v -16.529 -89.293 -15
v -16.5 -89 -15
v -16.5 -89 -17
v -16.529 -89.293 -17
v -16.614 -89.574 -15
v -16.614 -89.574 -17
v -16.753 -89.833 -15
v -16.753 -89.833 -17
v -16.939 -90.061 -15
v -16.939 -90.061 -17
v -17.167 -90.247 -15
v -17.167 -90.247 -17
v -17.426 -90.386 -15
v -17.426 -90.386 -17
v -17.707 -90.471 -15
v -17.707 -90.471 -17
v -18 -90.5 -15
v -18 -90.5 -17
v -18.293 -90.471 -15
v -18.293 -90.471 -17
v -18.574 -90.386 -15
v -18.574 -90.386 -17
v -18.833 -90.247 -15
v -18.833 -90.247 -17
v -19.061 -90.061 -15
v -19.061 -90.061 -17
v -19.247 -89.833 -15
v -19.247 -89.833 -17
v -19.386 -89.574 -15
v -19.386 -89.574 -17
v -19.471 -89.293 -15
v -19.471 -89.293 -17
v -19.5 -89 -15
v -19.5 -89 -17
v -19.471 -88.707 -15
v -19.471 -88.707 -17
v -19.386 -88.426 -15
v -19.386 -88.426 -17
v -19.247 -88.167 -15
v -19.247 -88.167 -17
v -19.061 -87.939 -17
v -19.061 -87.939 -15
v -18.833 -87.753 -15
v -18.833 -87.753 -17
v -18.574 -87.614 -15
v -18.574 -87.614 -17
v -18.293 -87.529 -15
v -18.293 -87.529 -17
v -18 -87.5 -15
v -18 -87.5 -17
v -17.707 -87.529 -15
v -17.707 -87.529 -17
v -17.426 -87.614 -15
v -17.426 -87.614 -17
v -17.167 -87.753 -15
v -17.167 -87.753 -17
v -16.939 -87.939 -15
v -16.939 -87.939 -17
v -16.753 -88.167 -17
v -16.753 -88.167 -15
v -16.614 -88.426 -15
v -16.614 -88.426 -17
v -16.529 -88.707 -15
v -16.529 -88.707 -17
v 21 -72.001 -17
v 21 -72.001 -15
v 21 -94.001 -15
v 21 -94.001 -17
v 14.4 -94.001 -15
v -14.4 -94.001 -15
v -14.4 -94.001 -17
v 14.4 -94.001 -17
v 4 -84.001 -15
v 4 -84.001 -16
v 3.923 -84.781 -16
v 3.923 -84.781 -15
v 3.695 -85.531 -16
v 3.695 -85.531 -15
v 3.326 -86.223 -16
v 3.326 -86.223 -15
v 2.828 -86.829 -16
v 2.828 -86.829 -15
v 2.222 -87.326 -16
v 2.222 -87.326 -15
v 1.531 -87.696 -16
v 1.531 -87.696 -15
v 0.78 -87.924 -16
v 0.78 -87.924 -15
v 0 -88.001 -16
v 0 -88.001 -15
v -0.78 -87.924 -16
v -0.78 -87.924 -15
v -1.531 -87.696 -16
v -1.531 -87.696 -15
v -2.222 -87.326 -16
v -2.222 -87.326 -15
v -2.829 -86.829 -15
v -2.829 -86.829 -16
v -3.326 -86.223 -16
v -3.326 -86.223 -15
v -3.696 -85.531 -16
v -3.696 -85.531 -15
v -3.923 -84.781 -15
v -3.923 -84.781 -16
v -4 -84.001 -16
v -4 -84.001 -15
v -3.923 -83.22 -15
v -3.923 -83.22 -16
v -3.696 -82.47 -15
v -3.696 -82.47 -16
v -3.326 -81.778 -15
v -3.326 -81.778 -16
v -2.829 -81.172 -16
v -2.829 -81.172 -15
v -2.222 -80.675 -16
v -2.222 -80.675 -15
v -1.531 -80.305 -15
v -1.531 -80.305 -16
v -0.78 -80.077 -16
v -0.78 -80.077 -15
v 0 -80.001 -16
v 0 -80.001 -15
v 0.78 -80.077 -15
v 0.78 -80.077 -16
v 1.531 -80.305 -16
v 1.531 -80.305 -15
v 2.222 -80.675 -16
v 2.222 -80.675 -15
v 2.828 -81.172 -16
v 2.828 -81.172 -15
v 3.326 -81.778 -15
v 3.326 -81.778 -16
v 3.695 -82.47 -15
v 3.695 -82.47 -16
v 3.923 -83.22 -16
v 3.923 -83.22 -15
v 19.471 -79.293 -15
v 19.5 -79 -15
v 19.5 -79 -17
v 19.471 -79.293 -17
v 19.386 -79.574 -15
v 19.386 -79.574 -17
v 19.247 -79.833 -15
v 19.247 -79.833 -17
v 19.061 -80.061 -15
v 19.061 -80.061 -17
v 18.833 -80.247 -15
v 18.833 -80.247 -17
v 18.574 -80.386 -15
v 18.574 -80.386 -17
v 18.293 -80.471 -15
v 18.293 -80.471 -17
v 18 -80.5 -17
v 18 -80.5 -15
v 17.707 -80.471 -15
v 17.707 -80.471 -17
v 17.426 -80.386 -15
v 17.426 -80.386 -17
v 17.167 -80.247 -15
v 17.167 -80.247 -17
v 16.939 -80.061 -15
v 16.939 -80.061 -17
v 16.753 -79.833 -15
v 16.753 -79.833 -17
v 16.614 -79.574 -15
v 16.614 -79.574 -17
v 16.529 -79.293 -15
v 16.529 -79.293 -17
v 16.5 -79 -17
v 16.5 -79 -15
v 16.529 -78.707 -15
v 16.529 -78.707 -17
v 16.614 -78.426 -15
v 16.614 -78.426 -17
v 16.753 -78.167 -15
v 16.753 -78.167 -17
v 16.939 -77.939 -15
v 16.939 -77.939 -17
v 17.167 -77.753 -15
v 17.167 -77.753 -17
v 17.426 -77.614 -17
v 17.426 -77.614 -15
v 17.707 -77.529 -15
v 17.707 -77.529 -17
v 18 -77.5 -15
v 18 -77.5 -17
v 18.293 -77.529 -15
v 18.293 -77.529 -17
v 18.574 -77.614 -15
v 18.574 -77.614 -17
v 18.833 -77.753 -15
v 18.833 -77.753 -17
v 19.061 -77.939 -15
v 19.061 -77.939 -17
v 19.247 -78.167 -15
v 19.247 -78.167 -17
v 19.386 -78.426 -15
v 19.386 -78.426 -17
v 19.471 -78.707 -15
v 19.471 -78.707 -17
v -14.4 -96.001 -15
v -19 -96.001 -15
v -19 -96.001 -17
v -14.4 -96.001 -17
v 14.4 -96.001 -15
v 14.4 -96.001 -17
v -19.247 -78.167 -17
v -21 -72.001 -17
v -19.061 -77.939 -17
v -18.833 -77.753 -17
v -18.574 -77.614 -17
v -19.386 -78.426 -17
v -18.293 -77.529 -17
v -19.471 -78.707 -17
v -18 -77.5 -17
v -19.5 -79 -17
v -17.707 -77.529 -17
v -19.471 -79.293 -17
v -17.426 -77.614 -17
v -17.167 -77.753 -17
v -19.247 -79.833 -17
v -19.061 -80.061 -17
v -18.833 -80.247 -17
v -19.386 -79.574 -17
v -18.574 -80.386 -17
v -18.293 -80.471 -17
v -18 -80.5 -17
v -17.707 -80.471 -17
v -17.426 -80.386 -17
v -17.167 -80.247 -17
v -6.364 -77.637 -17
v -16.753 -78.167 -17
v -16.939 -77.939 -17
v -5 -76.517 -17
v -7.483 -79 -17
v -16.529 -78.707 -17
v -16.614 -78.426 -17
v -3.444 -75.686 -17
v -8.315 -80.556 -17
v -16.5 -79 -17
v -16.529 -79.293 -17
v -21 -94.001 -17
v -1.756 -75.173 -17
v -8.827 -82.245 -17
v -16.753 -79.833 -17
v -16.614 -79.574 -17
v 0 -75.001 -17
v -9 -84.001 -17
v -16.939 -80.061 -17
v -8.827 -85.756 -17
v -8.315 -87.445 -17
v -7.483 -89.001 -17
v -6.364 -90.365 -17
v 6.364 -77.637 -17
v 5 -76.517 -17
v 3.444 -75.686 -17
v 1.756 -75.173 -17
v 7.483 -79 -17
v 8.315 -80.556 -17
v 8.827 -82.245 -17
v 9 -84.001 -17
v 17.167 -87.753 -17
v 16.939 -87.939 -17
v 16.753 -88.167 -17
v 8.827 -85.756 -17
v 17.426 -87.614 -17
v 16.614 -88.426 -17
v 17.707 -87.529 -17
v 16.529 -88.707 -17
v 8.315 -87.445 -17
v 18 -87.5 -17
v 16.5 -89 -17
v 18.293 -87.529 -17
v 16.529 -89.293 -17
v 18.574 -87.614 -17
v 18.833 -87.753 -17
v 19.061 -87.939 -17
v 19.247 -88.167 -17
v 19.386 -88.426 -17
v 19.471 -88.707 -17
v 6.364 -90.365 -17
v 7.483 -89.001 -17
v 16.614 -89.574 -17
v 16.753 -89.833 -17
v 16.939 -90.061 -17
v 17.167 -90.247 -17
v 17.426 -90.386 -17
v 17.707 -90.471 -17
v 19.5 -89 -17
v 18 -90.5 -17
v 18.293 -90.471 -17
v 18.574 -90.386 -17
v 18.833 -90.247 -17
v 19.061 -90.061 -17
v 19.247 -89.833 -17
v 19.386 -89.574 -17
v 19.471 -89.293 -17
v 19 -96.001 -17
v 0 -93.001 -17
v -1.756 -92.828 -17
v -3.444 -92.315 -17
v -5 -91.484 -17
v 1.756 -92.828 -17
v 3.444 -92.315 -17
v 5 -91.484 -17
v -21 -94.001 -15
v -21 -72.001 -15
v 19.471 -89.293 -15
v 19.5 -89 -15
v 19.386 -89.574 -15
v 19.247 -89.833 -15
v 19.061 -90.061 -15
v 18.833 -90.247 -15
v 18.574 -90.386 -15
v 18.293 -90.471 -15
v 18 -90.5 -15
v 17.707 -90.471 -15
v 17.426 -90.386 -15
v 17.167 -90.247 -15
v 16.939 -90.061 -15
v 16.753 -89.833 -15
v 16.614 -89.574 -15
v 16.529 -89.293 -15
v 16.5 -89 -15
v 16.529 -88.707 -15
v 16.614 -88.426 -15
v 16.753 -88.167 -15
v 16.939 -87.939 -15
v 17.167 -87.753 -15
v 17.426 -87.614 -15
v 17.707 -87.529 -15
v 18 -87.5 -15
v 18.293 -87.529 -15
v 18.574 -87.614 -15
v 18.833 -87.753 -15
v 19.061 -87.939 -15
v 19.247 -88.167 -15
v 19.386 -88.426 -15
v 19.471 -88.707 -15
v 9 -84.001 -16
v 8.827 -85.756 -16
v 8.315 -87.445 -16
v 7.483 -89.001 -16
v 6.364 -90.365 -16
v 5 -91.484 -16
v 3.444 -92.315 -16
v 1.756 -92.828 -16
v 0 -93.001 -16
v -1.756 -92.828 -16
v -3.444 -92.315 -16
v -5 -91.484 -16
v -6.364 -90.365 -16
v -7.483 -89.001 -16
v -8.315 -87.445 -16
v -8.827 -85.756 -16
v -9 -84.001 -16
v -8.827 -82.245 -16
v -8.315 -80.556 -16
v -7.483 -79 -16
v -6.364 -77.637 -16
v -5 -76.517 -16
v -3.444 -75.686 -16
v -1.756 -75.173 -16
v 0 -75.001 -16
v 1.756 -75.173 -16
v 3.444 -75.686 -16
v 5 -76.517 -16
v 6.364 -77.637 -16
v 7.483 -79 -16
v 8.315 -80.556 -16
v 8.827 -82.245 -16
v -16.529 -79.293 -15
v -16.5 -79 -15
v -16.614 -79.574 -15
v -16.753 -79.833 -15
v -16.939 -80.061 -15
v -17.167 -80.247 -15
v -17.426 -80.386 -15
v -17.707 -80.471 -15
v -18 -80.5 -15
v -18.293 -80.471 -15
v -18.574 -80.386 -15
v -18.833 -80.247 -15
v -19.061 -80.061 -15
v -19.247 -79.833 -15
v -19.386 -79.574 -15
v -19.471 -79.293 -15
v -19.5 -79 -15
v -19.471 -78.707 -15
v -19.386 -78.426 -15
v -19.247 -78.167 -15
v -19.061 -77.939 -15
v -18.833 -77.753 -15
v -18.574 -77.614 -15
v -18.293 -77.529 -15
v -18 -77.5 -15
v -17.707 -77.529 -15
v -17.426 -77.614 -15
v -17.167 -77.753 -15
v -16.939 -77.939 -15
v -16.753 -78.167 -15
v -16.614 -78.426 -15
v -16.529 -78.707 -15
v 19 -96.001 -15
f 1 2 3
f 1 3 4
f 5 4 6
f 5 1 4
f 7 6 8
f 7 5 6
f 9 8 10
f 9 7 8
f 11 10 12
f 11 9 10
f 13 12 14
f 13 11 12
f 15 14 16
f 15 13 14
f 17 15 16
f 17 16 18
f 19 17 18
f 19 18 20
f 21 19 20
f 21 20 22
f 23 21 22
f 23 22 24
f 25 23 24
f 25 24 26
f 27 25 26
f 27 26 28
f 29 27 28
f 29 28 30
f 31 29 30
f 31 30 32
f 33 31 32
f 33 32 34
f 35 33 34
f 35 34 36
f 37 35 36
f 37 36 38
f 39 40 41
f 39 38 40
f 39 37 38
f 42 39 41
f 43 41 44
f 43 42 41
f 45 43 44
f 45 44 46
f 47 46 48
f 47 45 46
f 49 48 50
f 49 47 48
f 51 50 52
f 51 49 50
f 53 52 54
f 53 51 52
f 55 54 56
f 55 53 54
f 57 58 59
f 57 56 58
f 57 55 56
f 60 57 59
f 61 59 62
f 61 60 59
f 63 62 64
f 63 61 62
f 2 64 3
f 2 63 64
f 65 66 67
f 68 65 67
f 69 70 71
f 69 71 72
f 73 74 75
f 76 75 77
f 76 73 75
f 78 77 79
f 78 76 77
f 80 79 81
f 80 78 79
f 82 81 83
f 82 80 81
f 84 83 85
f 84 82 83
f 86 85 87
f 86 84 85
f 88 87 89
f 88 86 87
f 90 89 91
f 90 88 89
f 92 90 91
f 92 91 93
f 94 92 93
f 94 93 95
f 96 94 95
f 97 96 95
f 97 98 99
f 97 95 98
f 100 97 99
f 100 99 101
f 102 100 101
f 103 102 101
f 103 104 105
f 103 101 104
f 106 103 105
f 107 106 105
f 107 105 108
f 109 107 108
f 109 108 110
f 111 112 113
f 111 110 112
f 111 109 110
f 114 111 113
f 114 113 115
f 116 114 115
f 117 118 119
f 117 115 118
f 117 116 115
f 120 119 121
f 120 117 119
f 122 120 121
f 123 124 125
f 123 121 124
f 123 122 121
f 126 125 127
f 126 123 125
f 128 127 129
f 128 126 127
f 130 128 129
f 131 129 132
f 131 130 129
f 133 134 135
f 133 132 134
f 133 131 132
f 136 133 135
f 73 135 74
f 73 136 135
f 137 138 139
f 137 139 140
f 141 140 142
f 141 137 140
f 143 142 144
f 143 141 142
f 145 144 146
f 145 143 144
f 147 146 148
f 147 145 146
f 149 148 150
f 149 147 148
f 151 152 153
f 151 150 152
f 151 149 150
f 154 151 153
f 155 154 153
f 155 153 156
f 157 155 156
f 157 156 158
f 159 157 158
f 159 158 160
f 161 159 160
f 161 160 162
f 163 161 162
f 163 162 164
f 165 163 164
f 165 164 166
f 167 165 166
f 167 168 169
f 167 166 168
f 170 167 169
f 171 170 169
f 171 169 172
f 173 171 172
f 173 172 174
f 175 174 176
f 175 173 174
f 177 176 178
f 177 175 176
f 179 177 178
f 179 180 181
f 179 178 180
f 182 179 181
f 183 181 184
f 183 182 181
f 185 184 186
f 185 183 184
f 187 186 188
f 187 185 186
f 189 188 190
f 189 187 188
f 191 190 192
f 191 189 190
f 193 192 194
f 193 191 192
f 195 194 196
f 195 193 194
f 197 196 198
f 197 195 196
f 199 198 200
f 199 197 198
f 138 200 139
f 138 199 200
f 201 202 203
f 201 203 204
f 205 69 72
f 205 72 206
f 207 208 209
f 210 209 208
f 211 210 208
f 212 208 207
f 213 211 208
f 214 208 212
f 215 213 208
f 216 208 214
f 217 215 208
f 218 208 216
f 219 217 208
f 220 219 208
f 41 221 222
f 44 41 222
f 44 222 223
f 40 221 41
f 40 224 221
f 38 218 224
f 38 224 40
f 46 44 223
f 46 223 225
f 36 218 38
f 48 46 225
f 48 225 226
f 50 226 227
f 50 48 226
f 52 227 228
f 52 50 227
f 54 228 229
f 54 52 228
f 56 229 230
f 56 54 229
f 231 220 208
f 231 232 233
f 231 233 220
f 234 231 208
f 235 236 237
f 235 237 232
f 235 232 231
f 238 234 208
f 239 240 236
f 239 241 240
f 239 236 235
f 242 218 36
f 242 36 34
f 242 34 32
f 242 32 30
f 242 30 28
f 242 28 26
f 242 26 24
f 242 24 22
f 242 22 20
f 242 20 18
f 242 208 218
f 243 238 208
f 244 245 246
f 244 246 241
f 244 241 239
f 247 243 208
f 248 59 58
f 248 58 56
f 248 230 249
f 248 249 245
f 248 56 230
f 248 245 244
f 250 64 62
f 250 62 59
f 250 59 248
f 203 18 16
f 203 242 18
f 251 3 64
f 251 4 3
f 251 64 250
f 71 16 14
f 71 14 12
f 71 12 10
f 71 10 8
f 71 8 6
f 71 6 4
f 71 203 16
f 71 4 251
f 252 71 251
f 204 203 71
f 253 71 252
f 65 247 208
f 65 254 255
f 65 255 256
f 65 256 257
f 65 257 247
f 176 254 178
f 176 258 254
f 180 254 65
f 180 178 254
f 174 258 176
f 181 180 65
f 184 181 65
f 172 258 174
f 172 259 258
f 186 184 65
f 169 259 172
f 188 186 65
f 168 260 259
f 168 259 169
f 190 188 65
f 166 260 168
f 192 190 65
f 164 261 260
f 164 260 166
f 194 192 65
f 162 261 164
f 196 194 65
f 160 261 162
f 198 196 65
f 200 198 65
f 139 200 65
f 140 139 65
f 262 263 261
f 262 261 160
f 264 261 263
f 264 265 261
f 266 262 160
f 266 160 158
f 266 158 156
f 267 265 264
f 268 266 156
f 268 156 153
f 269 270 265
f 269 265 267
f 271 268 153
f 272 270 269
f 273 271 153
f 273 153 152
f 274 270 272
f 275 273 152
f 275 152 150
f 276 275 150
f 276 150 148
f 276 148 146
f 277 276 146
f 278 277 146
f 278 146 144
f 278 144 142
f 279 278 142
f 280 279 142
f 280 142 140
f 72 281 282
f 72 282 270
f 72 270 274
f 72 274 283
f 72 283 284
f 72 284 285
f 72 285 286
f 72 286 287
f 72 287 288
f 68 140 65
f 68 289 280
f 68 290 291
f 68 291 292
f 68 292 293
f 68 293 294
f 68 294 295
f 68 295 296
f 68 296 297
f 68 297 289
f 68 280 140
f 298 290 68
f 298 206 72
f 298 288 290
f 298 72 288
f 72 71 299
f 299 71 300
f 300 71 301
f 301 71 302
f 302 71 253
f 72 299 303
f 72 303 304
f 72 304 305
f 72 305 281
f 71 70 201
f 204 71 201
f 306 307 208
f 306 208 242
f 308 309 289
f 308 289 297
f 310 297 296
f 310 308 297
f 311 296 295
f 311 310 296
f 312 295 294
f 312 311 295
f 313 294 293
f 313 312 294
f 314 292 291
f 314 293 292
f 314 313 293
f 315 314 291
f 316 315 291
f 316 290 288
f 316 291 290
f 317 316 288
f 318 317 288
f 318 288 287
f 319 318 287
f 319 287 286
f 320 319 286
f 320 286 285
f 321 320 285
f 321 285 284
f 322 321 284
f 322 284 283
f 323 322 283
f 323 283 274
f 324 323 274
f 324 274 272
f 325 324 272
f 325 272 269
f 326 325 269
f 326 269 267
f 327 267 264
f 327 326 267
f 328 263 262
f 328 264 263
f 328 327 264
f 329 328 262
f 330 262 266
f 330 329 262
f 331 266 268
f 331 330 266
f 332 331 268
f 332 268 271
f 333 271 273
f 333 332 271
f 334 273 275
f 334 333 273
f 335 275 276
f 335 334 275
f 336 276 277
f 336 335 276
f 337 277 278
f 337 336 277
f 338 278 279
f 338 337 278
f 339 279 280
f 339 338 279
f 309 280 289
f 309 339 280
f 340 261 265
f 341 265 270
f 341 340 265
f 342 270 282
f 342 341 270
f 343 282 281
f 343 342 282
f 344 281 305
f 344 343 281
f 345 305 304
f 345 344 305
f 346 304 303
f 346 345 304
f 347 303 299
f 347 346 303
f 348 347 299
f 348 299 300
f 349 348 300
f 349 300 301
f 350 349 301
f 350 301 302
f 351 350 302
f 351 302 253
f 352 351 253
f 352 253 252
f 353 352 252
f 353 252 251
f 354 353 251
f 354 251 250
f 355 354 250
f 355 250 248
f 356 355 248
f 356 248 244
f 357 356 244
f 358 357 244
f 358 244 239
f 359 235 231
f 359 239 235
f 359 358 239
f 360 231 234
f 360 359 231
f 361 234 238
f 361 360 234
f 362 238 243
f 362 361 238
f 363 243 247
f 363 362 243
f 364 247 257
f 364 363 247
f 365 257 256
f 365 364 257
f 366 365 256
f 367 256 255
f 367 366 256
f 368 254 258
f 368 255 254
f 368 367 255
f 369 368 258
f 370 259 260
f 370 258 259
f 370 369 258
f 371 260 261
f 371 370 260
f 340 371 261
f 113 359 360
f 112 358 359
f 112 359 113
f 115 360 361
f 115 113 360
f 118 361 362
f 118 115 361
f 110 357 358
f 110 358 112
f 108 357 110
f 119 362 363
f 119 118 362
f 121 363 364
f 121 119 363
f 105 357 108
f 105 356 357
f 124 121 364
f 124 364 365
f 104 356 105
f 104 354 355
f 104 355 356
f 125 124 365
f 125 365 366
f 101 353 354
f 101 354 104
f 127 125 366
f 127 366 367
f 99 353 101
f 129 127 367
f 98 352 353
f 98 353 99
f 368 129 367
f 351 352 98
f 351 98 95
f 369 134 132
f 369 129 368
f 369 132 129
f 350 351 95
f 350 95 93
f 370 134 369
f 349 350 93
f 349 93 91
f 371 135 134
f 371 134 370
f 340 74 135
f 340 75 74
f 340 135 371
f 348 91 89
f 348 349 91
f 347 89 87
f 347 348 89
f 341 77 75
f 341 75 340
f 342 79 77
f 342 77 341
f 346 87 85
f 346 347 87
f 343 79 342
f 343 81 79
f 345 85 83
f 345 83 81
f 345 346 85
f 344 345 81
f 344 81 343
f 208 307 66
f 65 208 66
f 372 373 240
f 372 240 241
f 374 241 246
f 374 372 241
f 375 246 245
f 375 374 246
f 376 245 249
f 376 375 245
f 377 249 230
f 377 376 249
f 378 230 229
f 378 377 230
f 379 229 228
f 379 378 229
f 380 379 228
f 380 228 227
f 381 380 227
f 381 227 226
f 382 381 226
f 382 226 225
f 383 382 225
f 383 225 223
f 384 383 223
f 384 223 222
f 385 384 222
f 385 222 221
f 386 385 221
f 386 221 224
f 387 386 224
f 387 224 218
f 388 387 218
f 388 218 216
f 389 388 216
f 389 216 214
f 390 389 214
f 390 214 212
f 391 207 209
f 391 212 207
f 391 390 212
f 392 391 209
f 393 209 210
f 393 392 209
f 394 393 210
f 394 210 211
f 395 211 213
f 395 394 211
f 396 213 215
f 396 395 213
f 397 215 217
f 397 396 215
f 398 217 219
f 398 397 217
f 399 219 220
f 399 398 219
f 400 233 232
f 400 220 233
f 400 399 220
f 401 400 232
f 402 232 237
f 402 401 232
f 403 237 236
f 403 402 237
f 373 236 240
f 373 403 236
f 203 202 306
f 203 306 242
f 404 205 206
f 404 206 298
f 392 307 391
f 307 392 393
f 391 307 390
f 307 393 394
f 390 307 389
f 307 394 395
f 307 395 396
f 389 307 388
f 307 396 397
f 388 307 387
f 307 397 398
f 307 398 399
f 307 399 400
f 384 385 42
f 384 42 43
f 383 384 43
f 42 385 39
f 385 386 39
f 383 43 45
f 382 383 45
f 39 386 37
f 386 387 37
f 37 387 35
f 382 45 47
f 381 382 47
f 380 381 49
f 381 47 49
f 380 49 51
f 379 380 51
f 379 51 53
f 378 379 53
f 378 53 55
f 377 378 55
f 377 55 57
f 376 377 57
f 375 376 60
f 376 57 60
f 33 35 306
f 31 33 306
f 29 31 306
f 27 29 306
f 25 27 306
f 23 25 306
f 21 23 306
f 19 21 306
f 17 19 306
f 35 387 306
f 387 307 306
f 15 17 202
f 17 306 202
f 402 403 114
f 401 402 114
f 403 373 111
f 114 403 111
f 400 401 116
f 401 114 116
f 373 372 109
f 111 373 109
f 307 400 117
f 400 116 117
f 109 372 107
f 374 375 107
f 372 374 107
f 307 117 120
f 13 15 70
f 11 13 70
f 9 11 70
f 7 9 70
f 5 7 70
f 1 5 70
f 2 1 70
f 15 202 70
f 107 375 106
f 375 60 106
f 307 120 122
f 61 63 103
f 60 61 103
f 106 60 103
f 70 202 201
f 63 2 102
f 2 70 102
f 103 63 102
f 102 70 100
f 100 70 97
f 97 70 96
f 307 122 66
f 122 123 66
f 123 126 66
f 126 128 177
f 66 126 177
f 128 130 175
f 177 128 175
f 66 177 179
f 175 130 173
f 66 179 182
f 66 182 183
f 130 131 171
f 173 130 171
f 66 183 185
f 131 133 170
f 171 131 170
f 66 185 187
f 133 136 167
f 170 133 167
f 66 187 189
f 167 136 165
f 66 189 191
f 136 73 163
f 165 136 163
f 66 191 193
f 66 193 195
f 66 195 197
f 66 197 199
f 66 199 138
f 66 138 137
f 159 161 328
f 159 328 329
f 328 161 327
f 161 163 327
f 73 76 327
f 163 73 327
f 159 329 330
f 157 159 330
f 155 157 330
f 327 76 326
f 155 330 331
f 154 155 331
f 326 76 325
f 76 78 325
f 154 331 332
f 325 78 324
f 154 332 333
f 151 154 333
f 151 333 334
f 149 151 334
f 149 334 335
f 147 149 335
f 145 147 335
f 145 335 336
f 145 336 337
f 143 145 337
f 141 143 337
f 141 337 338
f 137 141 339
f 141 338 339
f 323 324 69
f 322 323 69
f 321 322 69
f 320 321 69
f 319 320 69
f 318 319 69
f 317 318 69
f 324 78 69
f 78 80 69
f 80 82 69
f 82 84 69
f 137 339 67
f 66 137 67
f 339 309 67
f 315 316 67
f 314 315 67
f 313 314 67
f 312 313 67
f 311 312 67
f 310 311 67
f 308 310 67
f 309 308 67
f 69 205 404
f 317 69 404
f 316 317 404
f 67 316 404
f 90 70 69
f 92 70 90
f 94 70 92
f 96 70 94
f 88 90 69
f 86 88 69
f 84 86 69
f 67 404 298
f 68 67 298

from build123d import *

# Parameters (mm, degrees)
CYLINDER1760_R               = 9
CYLINDER1760_DEPTH           = 4
CYLINDER1760_PLACEMENT_ANGLE = 225
BOX711_W                     = 28.8
BOX711_H                     = 2
BOX711_DEPTH                 = 4
COMPOUND890_PLACEMENT_ANGLE  = 225
CYLINDER1692_R               = 1.5
CYLINDER1692_DEPTH           = 60
CYLINDER1689_R               = 1.5
CYLINDER1689_DEPTH           = 60
CYLINDER1690_R               = 1.5
CYLINDER1690_DEPTH           = 60
CYLINDER1691_R               = 1.5
CYLINDER1691_DEPTH           = 60
COMPOUND833_PLACEMENT_ANGLE  = 225
CYLINDER2367_R               = 4
CYLINDER2367_DEPTH           = 4
CYLINDER2367_PLACEMENT_ANGLE = 225
BOX930_W                     = 42
BOX930_H                     = 24
BOX930_DEPTH                 = 2
COMPOUND818_PLACEMENT_ANGLE  = 225
CHAMFER058_SIZE              = 2
CHAMFER058_ROLL_ANGLE        = 180
CHAMFER058_PLACEMENT_ANGLE   = -135.000066


with BuildPart() as v_lec1760:
    # Cylinder1760 → Cylinder1760 (new body)
    with BuildSketch(Plane.XY):
        Circle(CYLINDER1760_R)
    extrude(amount=CYLINDER1760_DEPTH)


with BuildPart() as v_lec1760_1:
    # Cylinder1760 placement: moved
    add(v_lec1760.part.moved(Location((63.64, -63.64, 64))).rotate(Axis((63.64, -63.64, 64), (0, 0, 1)), CYLINDER1760_PLACEMENT_ANGLE))


with BuildPart() as compound890:
    # Box711 → Box711 (new body)
    with BuildSketch(Plane(origin=(-14.4, 10, 24), x_dir=(1, 0, 0), z_dir=(0, 0, 1))):
        with Locations((14.4, 1)):
            Rectangle(BOX711_W, BOX711_H)
    extrude(amount=BOX711_DEPTH)


with BuildPart() as compound890_1:
    # Compound890 placement: moved
    add(compound890.part.moved(Location((63.64, -63.64, 38))).rotate(Axis((63.64, -63.64, 38), (0, 0, 1)), COMPOUND890_PLACEMENT_ANGLE))


with BuildPart() as v_lec1692:
    # Cylinder1692 → Cylinder1692 (new body)
    with BuildSketch(Plane(origin=(18, 85, -57), x_dir=(1, 0, 0), z_dir=(0, 0, 1))):
        Circle(CYLINDER1692_R)
    extrude(amount=CYLINDER1692_DEPTH)


with BuildPart() as v_lec1689:
    # Cylinder1689 → Cylinder1689 (new body)
    with BuildSketch(Plane(origin=(-18, 85, -57), x_dir=(1, 0, 0), z_dir=(0, 0, 1))):
        Circle(CYLINDER1689_R)
    extrude(amount=CYLINDER1689_DEPTH)


with BuildPart() as v_lec1690:
    # Cylinder1690 → Cylinder1690 (new body)
    with BuildSketch(Plane(origin=(-18, 95, -57), x_dir=(1, 0, 0), z_dir=(0, 0, 1))):
        Circle(CYLINDER1690_R)
    extrude(amount=CYLINDER1690_DEPTH)


with BuildPart() as compound833:
    # Cylinder1691 → Cylinder1691 (new body)
    with BuildSketch(Plane(origin=(18, 95, -57), x_dir=(1, 0, 0), z_dir=(0, 0, 1))):
        Circle(CYLINDER1691_R)
    extrude(amount=CYLINDER1691_DEPTH)

    # Compound833: union Válec1692, Válec1689, Válec1690
    add(v_lec1692.part)
    add(v_lec1689.part)
    add(v_lec1690.part)


with BuildPart() as compound833_1:
    # Compound833 placement: moved
    add(compound833.part.moved(Location((0, 0, 100))).rotate(Axis((0, 0, 100), (0, 0, 1)), COMPOUND833_PLACEMENT_ANGLE))


with BuildPart() as v_lec2367:
    # Cylinder2367 → Cylinder2367 (new body)
    with BuildSketch(Plane.XY):
        Circle(CYLINDER2367_R)
    extrude(amount=CYLINDER2367_DEPTH)


with BuildPart() as v_lec2367_1:
    # Cylinder2367 placement: moved
    add(v_lec2367.part.moved(Location((63.64, -63.64, 76))).rotate(Axis((63.64, -63.64, 76), (0, 0, 1)), CYLINDER2367_PLACEMENT_ANGLE))


with BuildPart() as g_mini_encoder_washer:
    # Box930 → Box930 (new body)
    with BuildSketch(Plane(origin=(-21, -12, 34), x_dir=(1, 0, 0), z_dir=(0, 0, 1))):
        with Locations((21, 12)):
            Rectangle(BOX930_W, BOX930_H)
    extrude(amount=BOX930_DEPTH)


with BuildPart() as g_mini_encoder_washer_1:
    # Compound818 placement: moved
    add(g_mini_encoder_washer.part.moved(Location((63.64, -63.64, 42))).rotate(Axis((63.64, -63.64, 42), (0, 0, 1)), COMPOUND818_PLACEMENT_ANGLE))

    # Cut472: cut Válec2367
    add(v_lec2367_1.part, mode=Mode.SUBTRACT)


with BuildPart() as g_mini_encoder_washer_2:
    # Cut472 placement: moved
    add(g_mini_encoder_washer_1.part.moved(Location((0, 0, -10))))

    # Cut481: cut Compound833
    add(compound833_1.part, mode=Mode.SUBTRACT)


with BuildPart() as g_mini_encoder_washer_3:
    # Cut481 placement: moved
    add(g_mini_encoder_washer_2.part.moved(Location((0, 0, -3))))

    # Cut522: cut Compound890
    add(compound890_1.part, mode=Mode.SUBTRACT)

    # Cut523: cut Válec1760
    add(v_lec1760_1.part, mode=Mode.SUBTRACT)

    # Chamfer058
    chamfer058_edges = [g_mini_encoder_washer_3.edges().sort_by_distance(p)[0] for p in [
        (86.974524, -57.276039, 64),
        (57.276039, -86.974524, 64),
    ]]
    chamfer(chamfer058_edges, length=CHAMFER058_SIZE)


with BuildPart() as g_mini_encoder_washer_4:
    # Chamfer058 roll: moved
    add(g_mini_encoder_washer_3.part.rotate(Axis((0, 0, 0), (1, 0, 0)), CHAMFER058_ROLL_ANGLE))


with BuildPart() as g_mini_encoder_washer_5:
    # Chamfer058 placement: moved
    add(g_mini_encoder_washer_4.part.moved(Location((0, 6, 48))).rotate(Axis((0, 6, 48), (0, 0, 1)), CHAMFER058_PLACEMENT_ANGLE))


solid = g_mini_encoder_washer_5.part
